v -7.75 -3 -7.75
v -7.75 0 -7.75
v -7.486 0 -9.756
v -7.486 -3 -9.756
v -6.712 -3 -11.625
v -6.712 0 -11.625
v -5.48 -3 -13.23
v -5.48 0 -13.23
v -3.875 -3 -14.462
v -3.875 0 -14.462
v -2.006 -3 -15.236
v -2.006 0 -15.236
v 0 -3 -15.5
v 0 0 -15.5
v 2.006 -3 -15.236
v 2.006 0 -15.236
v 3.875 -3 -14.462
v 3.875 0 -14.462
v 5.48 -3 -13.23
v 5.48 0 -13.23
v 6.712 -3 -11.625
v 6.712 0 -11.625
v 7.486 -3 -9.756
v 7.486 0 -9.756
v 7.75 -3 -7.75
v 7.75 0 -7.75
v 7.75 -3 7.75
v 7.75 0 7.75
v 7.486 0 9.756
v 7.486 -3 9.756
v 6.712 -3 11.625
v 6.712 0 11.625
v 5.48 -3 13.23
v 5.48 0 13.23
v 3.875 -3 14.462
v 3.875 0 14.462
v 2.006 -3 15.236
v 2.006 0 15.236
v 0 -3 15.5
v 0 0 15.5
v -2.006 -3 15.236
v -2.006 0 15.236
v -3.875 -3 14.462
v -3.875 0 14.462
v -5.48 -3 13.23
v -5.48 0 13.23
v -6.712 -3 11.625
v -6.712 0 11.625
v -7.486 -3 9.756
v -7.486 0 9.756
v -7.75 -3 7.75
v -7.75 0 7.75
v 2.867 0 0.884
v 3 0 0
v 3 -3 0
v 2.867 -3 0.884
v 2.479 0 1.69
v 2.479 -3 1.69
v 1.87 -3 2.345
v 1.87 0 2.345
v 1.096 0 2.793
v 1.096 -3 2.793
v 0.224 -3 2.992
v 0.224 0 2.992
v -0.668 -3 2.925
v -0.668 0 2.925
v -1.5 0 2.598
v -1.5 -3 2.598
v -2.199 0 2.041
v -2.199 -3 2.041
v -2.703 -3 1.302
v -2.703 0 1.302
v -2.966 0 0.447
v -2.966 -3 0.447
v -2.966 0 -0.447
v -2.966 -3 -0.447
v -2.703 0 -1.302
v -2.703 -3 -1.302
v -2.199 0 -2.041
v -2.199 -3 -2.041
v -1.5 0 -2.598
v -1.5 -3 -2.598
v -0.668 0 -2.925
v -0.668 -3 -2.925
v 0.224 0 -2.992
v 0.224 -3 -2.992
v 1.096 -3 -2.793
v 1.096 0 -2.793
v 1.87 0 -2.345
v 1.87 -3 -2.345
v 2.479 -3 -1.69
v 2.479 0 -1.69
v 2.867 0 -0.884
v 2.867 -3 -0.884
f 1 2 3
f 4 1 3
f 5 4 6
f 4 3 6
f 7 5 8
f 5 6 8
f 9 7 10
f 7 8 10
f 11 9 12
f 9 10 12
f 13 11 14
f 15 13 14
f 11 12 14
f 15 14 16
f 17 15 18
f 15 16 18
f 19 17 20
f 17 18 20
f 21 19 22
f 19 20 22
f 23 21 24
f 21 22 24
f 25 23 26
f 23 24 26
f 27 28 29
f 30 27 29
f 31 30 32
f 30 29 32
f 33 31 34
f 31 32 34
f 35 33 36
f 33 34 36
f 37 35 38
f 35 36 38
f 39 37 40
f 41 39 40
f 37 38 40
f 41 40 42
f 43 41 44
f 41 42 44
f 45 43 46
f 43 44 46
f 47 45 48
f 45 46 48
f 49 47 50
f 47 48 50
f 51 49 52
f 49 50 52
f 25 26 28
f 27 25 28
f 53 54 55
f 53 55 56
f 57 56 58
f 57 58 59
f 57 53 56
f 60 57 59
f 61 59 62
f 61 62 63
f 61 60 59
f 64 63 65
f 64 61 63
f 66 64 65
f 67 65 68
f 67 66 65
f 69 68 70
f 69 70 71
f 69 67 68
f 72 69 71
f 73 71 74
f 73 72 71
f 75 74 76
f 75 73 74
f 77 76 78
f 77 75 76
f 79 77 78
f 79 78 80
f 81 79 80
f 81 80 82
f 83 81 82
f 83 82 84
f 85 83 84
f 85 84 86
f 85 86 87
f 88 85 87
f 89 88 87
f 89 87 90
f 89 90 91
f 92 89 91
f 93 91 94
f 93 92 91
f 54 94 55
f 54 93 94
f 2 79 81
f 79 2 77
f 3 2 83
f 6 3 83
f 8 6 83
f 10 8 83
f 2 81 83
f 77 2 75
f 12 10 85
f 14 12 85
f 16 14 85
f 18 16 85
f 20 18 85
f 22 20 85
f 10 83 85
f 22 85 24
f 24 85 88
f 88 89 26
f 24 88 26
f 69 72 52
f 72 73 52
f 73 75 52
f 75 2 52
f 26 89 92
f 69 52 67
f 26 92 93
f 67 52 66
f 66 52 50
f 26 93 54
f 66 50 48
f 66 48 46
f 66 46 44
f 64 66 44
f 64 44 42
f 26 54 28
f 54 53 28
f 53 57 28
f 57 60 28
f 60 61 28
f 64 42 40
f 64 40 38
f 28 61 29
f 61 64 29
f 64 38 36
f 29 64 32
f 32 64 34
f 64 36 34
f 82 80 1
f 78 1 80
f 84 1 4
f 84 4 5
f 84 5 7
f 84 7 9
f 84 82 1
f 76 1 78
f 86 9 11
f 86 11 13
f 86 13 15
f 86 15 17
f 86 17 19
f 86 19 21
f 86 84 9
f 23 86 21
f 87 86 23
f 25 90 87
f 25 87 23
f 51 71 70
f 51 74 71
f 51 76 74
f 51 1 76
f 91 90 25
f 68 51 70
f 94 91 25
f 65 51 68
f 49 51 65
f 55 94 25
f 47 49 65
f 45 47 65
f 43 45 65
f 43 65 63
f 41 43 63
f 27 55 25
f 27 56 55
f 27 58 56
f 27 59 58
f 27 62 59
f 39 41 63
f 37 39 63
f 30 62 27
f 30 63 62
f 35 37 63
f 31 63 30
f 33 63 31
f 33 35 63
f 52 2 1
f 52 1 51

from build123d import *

# Parameters (mm, degrees)
F0_W     = 15.5
F0_H     = 15.5
F0_R     = 3
F1_DEPTH = 3


with BuildPart() as f1:
    # F0 (on Front) → F1 (new body)
    with BuildSketch(Plane.XZ):
        with BuildLine():
            ThreePointArc((7.75, 7.75), (0, 15.5), (-7.75, 7.75))
            Line((-7.75, 7.75), (7.75, 7.75))
        make_face()
        Rectangle(F0_W, F0_H)
        Circle(F0_R, mode=Mode.SUBTRACT)
        with BuildLine():
            Line((7.75, -7.75), (-7.75, -7.75))
            ThreePointArc((-7.75, -7.75), (0, -15.5), (7.75, -7.75))
        make_face()
    extrude(amount=F1_DEPTH)


solid = f1.part
